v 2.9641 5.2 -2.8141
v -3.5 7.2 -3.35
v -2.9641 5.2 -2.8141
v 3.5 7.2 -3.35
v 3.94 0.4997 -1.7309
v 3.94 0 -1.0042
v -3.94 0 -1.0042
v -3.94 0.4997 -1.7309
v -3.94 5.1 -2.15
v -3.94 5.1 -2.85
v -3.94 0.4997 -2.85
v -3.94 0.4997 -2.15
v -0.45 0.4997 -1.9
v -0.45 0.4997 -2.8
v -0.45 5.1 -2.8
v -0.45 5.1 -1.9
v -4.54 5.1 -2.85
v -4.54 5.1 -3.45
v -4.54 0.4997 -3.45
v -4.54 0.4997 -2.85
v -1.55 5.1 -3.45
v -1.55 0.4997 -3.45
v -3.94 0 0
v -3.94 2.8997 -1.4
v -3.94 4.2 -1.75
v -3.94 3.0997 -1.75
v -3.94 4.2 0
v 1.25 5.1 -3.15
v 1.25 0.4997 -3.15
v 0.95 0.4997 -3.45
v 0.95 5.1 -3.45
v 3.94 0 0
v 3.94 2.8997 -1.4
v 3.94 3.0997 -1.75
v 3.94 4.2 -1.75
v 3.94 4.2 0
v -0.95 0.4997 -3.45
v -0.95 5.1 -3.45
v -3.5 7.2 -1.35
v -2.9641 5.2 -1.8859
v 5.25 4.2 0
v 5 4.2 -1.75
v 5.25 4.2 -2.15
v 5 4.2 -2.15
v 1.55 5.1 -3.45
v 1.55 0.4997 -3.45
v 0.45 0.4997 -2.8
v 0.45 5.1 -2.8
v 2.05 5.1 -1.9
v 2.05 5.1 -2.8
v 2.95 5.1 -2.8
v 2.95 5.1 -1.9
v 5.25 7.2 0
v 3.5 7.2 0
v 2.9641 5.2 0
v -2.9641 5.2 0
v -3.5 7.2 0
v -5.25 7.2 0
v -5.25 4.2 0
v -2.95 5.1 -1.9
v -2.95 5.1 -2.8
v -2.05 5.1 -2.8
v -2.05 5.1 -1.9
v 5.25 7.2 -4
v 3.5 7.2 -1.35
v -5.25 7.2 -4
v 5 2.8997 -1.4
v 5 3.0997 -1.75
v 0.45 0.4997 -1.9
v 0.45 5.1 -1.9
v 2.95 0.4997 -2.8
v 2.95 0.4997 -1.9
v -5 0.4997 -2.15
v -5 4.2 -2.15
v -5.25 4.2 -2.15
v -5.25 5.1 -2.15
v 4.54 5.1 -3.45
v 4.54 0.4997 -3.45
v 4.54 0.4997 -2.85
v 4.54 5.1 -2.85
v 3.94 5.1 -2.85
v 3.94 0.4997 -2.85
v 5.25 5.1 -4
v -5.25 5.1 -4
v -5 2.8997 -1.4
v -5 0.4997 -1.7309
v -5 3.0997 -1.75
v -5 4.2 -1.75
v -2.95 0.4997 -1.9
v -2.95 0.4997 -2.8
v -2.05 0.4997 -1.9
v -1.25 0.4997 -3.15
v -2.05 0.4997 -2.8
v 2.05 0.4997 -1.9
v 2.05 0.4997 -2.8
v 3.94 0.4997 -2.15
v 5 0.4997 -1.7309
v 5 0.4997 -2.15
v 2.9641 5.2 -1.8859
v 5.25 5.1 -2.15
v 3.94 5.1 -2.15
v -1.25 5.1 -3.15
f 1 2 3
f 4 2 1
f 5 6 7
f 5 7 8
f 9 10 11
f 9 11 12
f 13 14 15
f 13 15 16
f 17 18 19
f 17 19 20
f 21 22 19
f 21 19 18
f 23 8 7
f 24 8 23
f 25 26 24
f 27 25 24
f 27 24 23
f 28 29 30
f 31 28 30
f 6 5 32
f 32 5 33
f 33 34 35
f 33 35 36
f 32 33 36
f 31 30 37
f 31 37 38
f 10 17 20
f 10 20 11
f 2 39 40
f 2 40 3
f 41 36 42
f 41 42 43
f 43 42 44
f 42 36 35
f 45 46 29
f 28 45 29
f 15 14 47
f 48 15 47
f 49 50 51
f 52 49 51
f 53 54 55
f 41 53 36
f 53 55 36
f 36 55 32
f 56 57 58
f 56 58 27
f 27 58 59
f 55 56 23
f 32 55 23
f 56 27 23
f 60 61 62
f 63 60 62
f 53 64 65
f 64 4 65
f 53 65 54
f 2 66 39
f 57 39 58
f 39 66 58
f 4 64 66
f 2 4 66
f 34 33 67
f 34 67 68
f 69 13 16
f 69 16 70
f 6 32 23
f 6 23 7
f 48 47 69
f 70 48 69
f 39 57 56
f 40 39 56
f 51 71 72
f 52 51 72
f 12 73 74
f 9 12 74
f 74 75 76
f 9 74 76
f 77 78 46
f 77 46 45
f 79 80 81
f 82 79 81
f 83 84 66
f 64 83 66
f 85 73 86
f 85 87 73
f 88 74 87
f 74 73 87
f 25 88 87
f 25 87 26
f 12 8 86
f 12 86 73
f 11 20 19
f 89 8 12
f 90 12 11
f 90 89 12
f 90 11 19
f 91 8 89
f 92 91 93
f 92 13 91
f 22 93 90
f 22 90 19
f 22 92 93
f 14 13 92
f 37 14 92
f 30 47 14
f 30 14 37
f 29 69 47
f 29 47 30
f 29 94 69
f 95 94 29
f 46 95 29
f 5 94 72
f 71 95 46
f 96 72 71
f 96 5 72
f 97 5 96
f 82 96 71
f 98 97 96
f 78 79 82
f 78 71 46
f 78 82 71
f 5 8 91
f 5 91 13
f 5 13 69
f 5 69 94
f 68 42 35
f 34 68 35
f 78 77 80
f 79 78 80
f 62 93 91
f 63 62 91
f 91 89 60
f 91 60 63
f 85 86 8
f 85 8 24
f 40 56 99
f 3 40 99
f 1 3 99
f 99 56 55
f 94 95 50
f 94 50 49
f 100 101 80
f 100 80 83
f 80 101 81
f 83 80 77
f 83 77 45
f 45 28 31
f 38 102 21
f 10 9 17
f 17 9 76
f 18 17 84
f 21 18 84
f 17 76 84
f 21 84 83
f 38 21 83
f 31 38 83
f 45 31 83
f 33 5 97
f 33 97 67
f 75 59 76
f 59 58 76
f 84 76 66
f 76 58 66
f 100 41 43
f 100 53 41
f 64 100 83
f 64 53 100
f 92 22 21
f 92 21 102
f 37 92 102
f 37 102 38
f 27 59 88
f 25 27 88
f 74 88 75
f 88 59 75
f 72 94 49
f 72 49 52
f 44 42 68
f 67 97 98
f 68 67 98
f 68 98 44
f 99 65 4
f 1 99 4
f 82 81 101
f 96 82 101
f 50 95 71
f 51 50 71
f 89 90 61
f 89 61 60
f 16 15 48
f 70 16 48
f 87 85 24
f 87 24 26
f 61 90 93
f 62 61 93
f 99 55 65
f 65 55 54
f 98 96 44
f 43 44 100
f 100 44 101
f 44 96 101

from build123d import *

# Parameters (mm, degrees)
BOSS_EXTRUDE1_DEPTH      = 5
CUT_EXTRUDE1_DEPTH       = 10.560857702
SKETCH3_W                = 0.9
SKETCH3_H                = 0.9
CUT_EXTRUDE2_DEPTH       = 10.195860993
BOSS_EXTRUDE2_DEPTH      = 1.06
BOSS_EXTRUDE2_DEPTH_BACK = 8.94
CUT_EXTRUDE3_DEPTH       = 5.399847063
BOSS_EXTRUDE3_DEPTH      = 0.1
BOSS_EXTRUDE3_DEPTH_BACK = 2
SKETCH6_W                = 10
SKETCH6_H                = 4
SKETCH7_W                = 7
SKETCH7_H                = 2
CUT_EXTRUDE4_DEPTH       = 2
CUT_EXTRUDE4_DRAFT       = -15
CUT_EXTRUDE5_REACH       = 11.635
SKETCH9_W                = 1.06
SKETCH9_H                = 1.75
BOSS_EXTRUDE4_DEPTH      = 0.9
BOSS_EXTRUDE5_DEPTH      = 0.25
BOSS_EXTRUDE6_START      = -10.25
BOSS_EXTRUDE6_DEPTH      = 0.25


with BuildPart() as part:
    # Sketch1 → Boss-Extrude1 (new, symmetric)
    with BuildSketch(Plane(origin=(0, 0, 0), x_dir=(0, 0, -1), z_dir=(1, 0, 0))):
        Polygon((4, 7.1), (1.092777193, 7.1), (1.092777193, 6.499060719), (0, 6.499060719), (0, 0), (1.004213348, 0), (1.730924726, 0.499707627), (3.45, 0.499707627), (3.45, 5.89955469), (4, 5.89955469), align=None)
    extrude(amount=BOSS_EXTRUDE1_DEPTH, both=True)

    # Sketch2 → Cut-Extrude1 (cut, through all)
    with BuildSketch(Plane(origin=(0, 7.1, 0), x_dir=(1, 0, 0), z_dir=(0, 1, 0))):
        Polygon((-6, 4), (-4.54, 4), (-4.54, 2.85), (-3.94, 2.85), (-3.94, 2.15), (-5, 2.15), (-5, 1.75), (-3.94, 1.75), (-3.94, 0), (-6, 0), align=None)
        Polygon((6, 0), (6, 4), (4.54, 4), (4.54, 2.85), (3.94, 2.85), (3.94, 2.15), (5, 2.15), (5, 1.75), (3.94, 1.75), (3.94, 0), align=None)
    extrude(amount=-CUT_EXTRUDE1_DEPTH, mode=Mode.SUBTRACT)

    # Sketch3 → Cut-Extrude2 (cut, through all)
    with BuildSketch(Plane.XZ.offset(-0.499707627)):
        with Locations((0, -2.35)):
            Rectangle(SKETCH3_W, SKETCH3_H)
        with Locations((2.5, -2.35)):
            Rectangle(SKETCH3_W, SKETCH3_H)
        with Locations((-2.5, -2.35)):
            Rectangle(SKETCH3_W, SKETCH3_H)
    extrude(amount=-CUT_EXTRUDE2_DEPTH, mode=Mode.SUBTRACT)

    # Sketch4 → Boss-Extrude2 (add, two sides: drawn at the far end of the back side and taken through both)
    with BuildSketch(Plane(origin=(3.94, 0, 0), x_dir=(0, 0, -1), z_dir=(1, 0, 0)).offset(-BOSS_EXTRUDE2_DEPTH_BACK)):
        Polygon((1.75, 0.499707627), (1.730924726, 0.499707627), (1.4, 2.899707627), (1.75, 3.099707627), align=None)
    extrude(amount=BOSS_EXTRUDE2_DEPTH + BOSS_EXTRUDE2_DEPTH_BACK)

    # Sketch5 → Cut-Extrude3 (cut)
    with BuildSketch(Plane.XZ.offset(-0.499707627)):
        Polygon((-1.55, -3.45), (-1.25, -3.15), (-0.95, -3.45), align=None)
        Polygon((0.95, -3.45), (1.55, -3.45), (1.25, -3.15), align=None)
    extrude(amount=-CUT_EXTRUDE3_DEPTH, mode=Mode.SUBTRACT)

    # Sketch6 → Boss-Extrude3 (add, two sides: drawn at the far end of the back side and taken through both)
    with BuildSketch(Plane(origin=(0, 7.1, 0), x_dir=(1, 0, 0), z_dir=(0, 1, 0)).offset(-BOSS_EXTRUDE3_DEPTH_BACK)):
        with Locations((0, 2)):
            Rectangle(SKETCH6_W, SKETCH6_H)
    extrude(amount=BOSS_EXTRUDE3_DEPTH + BOSS_EXTRUDE3_DEPTH_BACK)


with BuildPart() as cut_extrude4_tool:
    # Sketch7 → Cut-Extrude4 (with draft: the straight prism first)
    with BuildSketch(Plane(origin=(0, 7.2, 0), x_dir=(1, 0, 0), z_dir=(0, 1, 0))):
        with Locations((0, 2.35)):
            Rectangle(SKETCH7_W, SKETCH7_H)
    extrude(amount=-CUT_EXTRUDE4_DEPTH)
    # Cut-Extrude4: the draft: its side faces are tilted about the plane it starts from
    cut_extrude4_sides = [cut_extrude4_tool.faces().sort_by_distance(p)[0] for p in [
        (-3.5, 6.2, -2.35),
        (0, 6.2, -1.35),
        (3.5, 6.2, -2.35),
        (0, 6.2, -3.35),
    ]]
    draft(cut_extrude4_sides, Plane(origin=(0, 7.2, 0), x_dir=(1, 0, 0), z_dir=(0, 1, 0)), CUT_EXTRUDE4_DRAFT)


with BuildPart() as part_1:
    add(part.part)

    # Cut-Extrude4: cut by cut_extrude4_tool
    add(cut_extrude4_tool.part, mode=Mode.SUBTRACT)

    # Cut-Extrude5: up to this face of the body (flat: up to its plane)
    cut_extrude5_end = Plane(part_1.part.faces().sort_by_distance((0, 6.22763459, -1.610544526))[0])
    # Sketch8 → Cut-Extrude5 (cut, up to the picked face)
    with BuildSketch(Plane.XY, mode=Mode.PRIVATE) as cut_extrude5_sk1:
        Polygon((-3.5, 7.2), (-2.964101615, 5.2), (2.964101615, 5.2), (3.5, 7.2), align=None)
    cut_extrude5_tool1 = split(extrude(cut_extrude5_sk1.sketch, amount=-CUT_EXTRUDE5_REACH, mode=Mode.PRIVATE), bisect_by=cut_extrude5_end, keep=Keep.BOTH, mode=Mode.PRIVATE)
    add(cut_extrude5_tool1.solids().sort_by(Axis((0, 6.227635, 0), (0, 0, -1)))[0], mode=Mode.SUBTRACT)

    # Sketch9 → Boss-Extrude4 (add)
    with BuildSketch(Plane.XZ.offset(-5.1)):
        with Locations((-4.47, -0.875)):
            Rectangle(SKETCH9_W, SKETCH9_H)
        with Locations((4.47, -0.875)):
            Rectangle(SKETCH9_W, SKETCH9_H)
    extrude(amount=BOSS_EXTRUDE4_DEPTH)

    # Sketch10 → Boss-Extrude5 (add)
    with BuildSketch(Plane(origin=(5, 0, 0), x_dir=(0, 0, -1), z_dir=(1, 0, 0))):
        Polygon((0, 4.2), (2.15, 4.2), (2.15, 5.1), (4, 5.1), (4, 7.2), (0, 7.2), align=None)
    extrude(amount=BOSS_EXTRUDE5_DEPTH)

    # Sketch10<2> → Boss-Extrude6 (add)
    with BuildSketch(Plane(origin=(5, 0, 0), x_dir=(0, 0, -1), z_dir=(1, 0, 0)).offset(BOSS_EXTRUDE6_START)):
        Polygon((0, 4.2), (2.15, 4.2), (2.15, 5.1), (4, 5.1), (4, 7.2), (0, 7.2), align=None)
    extrude(amount=BOSS_EXTRUDE6_DEPTH)


solid = part_1.part
